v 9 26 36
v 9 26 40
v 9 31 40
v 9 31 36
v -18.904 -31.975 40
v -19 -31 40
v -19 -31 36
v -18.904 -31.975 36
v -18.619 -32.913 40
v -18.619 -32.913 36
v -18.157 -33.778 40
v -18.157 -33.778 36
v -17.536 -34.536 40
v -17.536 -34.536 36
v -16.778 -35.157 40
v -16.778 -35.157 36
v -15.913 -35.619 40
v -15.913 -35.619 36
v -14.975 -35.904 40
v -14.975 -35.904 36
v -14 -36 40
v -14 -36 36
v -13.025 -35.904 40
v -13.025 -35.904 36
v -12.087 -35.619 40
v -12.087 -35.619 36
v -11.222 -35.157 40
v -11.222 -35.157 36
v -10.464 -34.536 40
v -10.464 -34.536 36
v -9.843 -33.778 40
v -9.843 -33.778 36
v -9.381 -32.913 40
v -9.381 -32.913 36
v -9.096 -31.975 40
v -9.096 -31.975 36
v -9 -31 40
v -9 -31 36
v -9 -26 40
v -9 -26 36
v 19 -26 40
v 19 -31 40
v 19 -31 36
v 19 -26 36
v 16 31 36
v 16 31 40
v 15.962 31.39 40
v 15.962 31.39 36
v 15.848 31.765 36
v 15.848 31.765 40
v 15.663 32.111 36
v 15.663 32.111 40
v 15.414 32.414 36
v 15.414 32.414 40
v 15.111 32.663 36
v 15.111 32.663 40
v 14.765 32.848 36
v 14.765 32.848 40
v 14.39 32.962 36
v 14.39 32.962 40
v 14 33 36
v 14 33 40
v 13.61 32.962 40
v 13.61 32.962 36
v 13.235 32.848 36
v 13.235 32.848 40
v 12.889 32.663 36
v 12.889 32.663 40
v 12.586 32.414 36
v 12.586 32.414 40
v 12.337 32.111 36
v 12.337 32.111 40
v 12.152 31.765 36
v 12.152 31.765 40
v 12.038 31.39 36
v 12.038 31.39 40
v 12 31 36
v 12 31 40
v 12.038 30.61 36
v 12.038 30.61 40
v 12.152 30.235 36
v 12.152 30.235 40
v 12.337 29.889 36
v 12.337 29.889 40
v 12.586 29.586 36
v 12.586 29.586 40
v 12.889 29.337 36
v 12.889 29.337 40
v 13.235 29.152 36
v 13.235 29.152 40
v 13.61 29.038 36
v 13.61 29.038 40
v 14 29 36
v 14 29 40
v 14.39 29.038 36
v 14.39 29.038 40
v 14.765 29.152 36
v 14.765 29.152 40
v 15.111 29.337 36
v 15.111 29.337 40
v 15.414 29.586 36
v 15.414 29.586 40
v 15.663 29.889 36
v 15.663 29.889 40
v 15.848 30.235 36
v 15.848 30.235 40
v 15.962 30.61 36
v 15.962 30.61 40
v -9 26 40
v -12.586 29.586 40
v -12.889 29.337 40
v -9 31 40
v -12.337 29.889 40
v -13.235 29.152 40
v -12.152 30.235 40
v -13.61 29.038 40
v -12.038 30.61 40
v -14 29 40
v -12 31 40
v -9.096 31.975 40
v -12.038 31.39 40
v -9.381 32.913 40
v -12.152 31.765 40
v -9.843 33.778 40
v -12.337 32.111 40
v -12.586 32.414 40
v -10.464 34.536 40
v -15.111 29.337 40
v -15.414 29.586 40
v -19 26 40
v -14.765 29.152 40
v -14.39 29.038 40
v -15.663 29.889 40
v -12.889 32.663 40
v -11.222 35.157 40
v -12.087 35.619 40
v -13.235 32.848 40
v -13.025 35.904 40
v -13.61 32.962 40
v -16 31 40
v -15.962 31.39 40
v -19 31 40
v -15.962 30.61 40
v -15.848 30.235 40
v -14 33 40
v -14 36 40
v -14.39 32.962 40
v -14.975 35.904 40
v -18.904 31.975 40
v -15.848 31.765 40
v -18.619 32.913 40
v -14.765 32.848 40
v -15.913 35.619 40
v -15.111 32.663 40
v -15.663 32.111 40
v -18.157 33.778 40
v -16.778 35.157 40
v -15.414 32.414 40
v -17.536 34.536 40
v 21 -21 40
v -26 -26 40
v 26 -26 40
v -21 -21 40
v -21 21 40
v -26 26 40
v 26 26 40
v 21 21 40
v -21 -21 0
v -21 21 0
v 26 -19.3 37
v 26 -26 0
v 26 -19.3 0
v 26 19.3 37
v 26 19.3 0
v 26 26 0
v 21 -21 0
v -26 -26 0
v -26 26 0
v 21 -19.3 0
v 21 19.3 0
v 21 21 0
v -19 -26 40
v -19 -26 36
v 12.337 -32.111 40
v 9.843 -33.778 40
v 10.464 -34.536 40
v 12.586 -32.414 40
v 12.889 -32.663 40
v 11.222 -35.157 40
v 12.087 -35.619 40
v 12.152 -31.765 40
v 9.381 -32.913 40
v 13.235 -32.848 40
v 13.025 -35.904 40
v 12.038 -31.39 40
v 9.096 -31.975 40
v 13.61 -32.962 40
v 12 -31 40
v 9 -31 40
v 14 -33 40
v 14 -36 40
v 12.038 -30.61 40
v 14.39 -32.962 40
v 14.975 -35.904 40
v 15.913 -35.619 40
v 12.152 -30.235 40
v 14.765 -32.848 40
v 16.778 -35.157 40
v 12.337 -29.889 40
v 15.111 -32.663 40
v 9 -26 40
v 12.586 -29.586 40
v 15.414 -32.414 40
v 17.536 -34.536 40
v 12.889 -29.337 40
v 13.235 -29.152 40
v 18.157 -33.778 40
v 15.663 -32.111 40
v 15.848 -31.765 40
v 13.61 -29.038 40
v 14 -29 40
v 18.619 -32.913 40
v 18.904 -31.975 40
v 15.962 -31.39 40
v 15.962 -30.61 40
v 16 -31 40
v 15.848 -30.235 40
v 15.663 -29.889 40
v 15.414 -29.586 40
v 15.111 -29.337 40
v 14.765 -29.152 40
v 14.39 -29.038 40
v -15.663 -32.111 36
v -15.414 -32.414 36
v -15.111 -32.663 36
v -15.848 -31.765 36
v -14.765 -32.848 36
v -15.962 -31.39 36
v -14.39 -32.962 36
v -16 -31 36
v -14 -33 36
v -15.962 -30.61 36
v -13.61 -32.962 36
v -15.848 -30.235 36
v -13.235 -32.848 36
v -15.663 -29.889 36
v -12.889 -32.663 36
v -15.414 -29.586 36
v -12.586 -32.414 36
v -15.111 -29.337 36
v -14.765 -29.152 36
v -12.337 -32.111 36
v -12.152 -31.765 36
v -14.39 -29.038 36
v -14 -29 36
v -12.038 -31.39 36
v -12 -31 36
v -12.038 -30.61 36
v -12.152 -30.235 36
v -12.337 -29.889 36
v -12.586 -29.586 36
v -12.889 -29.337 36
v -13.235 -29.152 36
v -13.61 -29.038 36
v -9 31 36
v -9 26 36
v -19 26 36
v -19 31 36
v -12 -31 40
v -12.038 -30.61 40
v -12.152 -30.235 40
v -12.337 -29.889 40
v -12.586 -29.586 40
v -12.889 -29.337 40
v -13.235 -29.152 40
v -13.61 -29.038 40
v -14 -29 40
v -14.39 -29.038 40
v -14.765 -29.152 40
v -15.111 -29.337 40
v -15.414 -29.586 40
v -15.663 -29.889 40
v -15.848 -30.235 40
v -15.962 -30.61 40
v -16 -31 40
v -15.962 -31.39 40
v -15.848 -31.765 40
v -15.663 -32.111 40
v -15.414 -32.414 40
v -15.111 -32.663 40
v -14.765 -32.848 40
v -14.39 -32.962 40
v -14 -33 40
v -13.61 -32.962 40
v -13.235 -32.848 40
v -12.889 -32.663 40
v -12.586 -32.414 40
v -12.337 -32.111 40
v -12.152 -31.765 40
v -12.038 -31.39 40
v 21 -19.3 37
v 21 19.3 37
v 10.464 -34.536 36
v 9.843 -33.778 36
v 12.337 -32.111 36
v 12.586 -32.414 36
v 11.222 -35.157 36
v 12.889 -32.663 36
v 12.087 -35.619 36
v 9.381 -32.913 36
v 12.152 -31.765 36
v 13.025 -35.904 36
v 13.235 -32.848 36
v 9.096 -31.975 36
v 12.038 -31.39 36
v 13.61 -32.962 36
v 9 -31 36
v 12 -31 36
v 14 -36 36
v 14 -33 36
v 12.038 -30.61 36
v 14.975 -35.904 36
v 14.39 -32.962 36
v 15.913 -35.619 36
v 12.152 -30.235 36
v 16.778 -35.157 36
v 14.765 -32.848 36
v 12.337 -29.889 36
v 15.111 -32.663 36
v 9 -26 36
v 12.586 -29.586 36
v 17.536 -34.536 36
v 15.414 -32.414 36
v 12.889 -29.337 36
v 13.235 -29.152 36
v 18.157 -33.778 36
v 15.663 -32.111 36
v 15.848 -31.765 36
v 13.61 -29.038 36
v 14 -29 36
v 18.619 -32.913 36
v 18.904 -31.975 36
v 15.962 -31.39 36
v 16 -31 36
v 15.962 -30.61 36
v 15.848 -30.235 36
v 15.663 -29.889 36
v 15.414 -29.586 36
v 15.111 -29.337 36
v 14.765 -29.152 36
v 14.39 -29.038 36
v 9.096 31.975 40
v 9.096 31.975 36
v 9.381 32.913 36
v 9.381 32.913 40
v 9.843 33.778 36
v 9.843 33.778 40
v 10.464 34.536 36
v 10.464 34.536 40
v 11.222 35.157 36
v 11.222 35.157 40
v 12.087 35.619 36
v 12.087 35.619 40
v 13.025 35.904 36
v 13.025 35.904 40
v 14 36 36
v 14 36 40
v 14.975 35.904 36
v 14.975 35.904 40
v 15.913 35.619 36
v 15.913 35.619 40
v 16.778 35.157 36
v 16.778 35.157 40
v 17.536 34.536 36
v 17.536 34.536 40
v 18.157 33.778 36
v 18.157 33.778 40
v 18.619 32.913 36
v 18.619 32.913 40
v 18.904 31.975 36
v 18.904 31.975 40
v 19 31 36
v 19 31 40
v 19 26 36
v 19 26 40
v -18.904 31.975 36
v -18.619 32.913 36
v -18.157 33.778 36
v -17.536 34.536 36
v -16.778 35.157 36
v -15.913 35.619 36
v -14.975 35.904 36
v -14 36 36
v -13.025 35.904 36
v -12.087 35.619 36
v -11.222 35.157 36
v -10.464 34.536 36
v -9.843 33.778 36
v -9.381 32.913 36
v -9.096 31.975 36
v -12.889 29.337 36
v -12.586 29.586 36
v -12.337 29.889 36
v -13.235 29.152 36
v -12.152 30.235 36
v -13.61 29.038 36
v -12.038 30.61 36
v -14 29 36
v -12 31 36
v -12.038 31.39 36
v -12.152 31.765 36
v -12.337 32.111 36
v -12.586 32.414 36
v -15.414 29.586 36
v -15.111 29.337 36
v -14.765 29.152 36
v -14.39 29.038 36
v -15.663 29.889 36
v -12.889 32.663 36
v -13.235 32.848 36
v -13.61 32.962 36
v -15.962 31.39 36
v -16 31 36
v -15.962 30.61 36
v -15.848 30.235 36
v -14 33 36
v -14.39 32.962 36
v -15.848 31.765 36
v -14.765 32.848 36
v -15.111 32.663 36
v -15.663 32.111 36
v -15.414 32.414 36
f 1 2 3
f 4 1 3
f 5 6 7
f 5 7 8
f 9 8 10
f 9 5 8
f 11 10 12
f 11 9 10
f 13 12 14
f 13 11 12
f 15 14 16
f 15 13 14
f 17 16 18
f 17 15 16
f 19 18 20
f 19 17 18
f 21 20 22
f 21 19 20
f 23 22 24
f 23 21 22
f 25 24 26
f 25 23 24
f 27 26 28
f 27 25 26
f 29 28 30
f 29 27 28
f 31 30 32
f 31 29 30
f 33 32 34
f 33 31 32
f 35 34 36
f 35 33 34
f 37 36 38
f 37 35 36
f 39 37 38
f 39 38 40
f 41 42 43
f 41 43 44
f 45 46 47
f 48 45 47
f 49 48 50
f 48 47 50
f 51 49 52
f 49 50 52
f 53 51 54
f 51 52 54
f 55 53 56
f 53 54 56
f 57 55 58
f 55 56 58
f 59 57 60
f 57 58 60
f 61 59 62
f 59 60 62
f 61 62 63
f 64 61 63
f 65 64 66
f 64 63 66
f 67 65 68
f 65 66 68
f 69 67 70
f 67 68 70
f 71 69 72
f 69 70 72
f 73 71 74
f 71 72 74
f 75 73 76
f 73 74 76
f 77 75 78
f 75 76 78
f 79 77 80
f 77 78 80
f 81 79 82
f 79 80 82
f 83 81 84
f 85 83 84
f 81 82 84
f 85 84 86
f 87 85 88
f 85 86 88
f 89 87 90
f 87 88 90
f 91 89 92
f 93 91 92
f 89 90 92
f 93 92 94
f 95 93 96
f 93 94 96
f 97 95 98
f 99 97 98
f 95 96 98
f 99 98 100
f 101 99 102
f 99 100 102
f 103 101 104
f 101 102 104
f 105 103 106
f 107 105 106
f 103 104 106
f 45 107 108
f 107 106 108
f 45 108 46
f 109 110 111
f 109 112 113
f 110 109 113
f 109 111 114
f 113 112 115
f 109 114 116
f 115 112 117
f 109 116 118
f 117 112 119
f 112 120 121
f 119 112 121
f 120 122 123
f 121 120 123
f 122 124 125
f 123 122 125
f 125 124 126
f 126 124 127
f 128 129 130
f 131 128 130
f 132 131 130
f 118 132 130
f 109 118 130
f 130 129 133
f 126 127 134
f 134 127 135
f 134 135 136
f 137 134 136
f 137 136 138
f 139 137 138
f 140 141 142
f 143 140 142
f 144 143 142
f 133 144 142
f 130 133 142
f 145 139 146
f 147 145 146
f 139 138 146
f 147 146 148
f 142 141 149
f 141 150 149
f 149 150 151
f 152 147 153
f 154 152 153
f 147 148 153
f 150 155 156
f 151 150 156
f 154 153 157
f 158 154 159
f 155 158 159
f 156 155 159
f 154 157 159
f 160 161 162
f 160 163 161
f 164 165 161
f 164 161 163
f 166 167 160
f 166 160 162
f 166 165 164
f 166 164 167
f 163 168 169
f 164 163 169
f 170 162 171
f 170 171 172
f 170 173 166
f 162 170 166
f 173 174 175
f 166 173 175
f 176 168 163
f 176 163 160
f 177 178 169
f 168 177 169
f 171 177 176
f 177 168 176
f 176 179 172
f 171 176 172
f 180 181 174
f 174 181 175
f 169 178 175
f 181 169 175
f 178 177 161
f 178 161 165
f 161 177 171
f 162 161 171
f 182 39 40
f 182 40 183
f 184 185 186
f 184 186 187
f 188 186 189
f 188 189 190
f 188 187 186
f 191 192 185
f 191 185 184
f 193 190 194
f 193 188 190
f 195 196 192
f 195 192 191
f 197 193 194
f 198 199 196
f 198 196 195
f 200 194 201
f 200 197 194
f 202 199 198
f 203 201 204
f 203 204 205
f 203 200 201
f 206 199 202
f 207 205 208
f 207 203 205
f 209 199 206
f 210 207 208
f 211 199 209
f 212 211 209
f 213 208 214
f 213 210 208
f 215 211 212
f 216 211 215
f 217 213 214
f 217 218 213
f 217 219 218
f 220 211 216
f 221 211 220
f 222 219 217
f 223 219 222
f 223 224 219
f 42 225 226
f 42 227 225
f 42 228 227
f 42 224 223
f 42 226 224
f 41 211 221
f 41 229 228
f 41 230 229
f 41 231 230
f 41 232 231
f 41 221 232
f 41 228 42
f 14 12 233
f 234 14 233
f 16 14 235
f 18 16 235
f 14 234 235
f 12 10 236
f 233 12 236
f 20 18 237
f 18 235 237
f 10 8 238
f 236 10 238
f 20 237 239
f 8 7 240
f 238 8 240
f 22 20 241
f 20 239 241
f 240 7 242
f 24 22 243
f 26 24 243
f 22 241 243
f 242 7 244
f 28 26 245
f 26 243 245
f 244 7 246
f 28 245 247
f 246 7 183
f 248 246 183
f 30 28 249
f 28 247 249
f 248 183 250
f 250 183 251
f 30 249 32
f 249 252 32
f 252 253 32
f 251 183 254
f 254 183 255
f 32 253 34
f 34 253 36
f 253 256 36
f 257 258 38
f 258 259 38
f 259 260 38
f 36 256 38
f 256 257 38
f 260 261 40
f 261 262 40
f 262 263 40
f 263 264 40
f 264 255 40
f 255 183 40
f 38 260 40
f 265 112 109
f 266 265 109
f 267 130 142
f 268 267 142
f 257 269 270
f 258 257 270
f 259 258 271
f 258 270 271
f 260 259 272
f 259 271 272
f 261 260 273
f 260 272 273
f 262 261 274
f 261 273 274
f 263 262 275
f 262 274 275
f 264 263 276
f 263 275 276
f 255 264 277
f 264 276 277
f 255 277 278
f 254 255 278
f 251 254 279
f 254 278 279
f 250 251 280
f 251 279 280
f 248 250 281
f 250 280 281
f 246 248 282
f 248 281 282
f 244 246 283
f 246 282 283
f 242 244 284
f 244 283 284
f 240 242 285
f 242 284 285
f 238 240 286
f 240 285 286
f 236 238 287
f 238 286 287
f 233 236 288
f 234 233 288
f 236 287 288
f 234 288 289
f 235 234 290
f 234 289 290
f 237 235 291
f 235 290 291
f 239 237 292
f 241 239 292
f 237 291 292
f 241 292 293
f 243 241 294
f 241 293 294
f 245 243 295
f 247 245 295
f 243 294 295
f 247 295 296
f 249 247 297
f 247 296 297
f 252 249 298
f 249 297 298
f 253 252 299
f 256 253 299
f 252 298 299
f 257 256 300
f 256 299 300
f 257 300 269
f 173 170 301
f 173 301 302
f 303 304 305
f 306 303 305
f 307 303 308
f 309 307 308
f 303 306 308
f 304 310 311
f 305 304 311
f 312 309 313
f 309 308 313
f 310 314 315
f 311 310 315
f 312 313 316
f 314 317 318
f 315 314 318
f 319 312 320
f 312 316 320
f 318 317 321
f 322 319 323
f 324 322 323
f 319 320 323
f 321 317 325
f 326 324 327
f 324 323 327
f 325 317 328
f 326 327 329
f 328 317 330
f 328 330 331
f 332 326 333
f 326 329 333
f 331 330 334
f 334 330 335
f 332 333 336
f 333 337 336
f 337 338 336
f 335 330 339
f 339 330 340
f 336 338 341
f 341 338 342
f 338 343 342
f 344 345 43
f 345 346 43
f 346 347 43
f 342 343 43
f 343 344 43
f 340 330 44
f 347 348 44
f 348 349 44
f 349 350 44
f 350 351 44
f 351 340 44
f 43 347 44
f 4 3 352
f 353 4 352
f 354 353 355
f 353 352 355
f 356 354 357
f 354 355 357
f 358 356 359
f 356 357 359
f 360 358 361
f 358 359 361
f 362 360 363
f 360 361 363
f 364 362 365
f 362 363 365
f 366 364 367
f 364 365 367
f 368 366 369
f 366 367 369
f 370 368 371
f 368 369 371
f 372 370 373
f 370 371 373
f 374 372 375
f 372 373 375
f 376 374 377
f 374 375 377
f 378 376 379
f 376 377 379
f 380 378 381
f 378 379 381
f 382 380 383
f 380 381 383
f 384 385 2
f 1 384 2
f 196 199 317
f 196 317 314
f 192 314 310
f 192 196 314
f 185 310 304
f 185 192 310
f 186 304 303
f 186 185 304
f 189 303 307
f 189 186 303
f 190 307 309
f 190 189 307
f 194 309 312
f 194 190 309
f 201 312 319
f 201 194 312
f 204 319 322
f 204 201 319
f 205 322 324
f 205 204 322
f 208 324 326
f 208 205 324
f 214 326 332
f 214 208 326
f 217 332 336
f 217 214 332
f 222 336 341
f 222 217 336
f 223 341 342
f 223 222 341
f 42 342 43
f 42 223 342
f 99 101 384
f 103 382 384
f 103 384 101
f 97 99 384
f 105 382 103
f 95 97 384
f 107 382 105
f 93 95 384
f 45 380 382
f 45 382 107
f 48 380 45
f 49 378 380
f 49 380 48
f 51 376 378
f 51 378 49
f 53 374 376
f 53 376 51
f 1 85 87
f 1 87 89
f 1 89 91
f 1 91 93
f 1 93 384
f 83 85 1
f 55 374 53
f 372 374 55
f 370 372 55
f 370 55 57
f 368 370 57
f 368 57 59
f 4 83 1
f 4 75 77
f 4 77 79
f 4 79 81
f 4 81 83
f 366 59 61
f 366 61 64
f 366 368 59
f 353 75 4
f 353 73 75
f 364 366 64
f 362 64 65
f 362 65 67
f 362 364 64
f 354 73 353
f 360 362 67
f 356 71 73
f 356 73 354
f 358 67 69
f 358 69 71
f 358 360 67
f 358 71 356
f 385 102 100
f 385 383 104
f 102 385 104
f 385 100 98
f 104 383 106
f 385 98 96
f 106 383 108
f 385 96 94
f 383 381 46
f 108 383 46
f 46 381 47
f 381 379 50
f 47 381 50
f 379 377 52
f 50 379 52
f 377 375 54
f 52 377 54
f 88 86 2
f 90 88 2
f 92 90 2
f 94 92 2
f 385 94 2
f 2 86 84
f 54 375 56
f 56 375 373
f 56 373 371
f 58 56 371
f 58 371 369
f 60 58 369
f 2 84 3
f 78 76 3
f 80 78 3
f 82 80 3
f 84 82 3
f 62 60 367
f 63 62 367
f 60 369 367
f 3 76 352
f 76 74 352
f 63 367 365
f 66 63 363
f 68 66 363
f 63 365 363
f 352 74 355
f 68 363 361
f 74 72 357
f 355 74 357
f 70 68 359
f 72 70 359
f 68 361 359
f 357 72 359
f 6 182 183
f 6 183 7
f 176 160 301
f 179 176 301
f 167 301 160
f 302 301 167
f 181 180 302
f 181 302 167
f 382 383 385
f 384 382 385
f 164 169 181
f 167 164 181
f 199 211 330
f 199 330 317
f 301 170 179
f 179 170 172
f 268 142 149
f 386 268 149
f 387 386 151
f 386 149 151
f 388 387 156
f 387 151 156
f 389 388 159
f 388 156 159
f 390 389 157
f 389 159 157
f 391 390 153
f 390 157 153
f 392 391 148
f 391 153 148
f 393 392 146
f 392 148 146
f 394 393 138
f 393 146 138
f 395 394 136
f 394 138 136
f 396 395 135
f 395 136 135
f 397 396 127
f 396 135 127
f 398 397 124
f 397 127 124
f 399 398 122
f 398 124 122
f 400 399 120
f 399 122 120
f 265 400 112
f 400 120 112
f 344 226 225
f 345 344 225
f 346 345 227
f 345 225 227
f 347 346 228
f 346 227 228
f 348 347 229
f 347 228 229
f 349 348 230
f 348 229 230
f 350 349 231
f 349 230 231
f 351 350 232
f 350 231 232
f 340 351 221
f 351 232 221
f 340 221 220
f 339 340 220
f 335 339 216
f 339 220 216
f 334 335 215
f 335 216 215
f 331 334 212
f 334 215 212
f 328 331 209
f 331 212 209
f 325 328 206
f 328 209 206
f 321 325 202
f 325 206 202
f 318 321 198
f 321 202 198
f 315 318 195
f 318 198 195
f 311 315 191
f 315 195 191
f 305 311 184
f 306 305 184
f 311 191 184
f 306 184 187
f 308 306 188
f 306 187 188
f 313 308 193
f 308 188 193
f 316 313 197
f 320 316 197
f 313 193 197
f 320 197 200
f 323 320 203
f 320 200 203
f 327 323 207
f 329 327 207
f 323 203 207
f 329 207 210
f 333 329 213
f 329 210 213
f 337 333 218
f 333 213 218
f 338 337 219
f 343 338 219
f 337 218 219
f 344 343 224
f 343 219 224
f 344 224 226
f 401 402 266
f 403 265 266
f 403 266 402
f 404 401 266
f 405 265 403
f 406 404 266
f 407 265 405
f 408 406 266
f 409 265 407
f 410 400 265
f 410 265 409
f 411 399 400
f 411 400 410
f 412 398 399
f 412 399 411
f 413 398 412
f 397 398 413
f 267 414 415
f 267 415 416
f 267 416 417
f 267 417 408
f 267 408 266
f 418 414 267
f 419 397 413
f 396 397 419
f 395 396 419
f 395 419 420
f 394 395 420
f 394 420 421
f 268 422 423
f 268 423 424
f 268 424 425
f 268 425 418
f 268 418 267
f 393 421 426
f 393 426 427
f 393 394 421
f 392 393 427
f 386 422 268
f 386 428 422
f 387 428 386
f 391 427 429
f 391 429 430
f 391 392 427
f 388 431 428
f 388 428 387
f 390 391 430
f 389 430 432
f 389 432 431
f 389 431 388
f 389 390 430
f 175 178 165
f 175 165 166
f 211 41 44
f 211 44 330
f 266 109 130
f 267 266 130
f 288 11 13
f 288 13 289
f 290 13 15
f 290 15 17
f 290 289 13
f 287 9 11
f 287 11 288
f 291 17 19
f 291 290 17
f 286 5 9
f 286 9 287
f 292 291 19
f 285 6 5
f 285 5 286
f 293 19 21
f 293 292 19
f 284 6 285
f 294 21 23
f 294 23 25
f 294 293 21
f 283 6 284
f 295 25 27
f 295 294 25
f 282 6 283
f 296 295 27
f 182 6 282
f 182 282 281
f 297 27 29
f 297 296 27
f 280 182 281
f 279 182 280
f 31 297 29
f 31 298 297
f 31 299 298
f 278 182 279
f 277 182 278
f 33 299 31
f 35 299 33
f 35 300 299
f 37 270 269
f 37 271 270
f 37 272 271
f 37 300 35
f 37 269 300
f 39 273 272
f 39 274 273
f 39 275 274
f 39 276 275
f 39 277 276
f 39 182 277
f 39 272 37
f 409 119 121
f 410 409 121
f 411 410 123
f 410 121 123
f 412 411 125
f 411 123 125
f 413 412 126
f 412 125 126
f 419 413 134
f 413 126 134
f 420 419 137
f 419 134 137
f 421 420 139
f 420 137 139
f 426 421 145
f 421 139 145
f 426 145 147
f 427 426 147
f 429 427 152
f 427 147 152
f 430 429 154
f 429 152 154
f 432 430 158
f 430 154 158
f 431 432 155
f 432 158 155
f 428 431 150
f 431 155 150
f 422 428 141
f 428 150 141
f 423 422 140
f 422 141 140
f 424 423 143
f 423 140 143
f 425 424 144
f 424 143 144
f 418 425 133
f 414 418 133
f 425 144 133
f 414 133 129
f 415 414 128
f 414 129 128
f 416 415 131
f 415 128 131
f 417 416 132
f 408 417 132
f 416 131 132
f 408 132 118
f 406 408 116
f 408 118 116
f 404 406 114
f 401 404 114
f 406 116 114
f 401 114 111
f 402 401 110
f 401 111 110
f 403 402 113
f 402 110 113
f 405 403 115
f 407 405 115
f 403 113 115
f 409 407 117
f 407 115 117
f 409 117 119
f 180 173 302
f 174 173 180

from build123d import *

# Parameters (mm, degrees)
SKETCH_2_W          = 52
SKETCH_2_H          = 52
EXTRUDE_1_DEPTH     = 40
SKETCH_1_W          = 42
SKETCH_1_H          = 42
CUT_EXTRUDE_1_DEPTH = 40
CUT_EXTRUDE_2_REACH = 54
SKETCH_4_W          = 37
SKETCH_4_H          = 38.6
SKETCH_5_R          = 2
EXTRUDE_2_DEPTH     = 4
EXTRUDE_2_2_DEPTH   = 4
EXTRUDE_2_3_DEPTH   = 4
EXTRUDE_2_4_DEPTH   = 4


with BuildPart() as part:
    # 草圖2 → 填料-伸長1 (new body)
    with BuildSketch(Plane.XY):
        Rectangle(SKETCH_2_W, SKETCH_2_H)
    extrude(amount=EXTRUDE_1_DEPTH)

    # 草圖1 → 除料-伸長1 (cut)
    with BuildSketch(Plane.XY):
        Rectangle(SKETCH_1_W, SKETCH_1_H)
    extrude(amount=CUT_EXTRUDE_1_DEPTH, mode=Mode.SUBTRACT)

    # 草圖4 → 除料-伸長2 (cut, up to next)
    with BuildSketch(Plane(origin=(26, 0, 0), x_dir=(0, 0, -1), z_dir=(1, 0, 0)), mode=Mode.PRIVATE) as cut_extrude_2_sk1:
        with Locations((-18.5, 0)):
            Rectangle(SKETCH_4_W, SKETCH_4_H)
    cut_extrude_2_tool1 = extrude(cut_extrude_2_sk1.sketch, amount=-CUT_EXTRUDE_2_REACH, mode=Mode.PRIVATE) & part.part
    add(cut_extrude_2_tool1.solids().sort_by_distance((26, 0, 18.5))[0], mode=Mode.SUBTRACT)


with BuildPart() as body_2:
    # 草圖5 → 填料-伸長2 (new body)
    with BuildSketch(Plane.XY.offset(40)):
        with BuildLine():
            Line((-19, 26), (-19, 31))
            ThreePointArc((-19, 31), (-14, 36), (-9, 31))
            Line((-9, 31), (-9, 26))
            Line((-9, 26), (-19, 26))
        make_face()
        with Locations((-14, 31)):
            Circle(SKETCH_5_R, mode=Mode.SUBTRACT)
    extrude(amount=-EXTRUDE_2_DEPTH)


with BuildPart() as body_3:
    # 草圖5 → Extrude 2 2 (new body)
    with BuildSketch(Plane.XY.offset(40)):
        with BuildLine():
            Line((19, 31), (19, 26))
            Line((19, 26), (9, 26))
            Line((9, 26), (9, 31))
            ThreePointArc((9, 31), (14, 36), (19, 31))
        make_face()
        with Locations((14, 31)):
            Circle(SKETCH_5_R, mode=Mode.SUBTRACT)
    extrude(amount=-EXTRUDE_2_2_DEPTH)


with BuildPart() as body_4:
    # 草圖5 → Extrude 2 3 (new body)
    with BuildSketch(Plane.XY.offset(40)):
        with BuildLine():
            Line((9, -26), (9, -31))
            ThreePointArc((9, -31), (14, -36), (19, -31))
            Line((19, -31), (19, -26))
            Line((19, -26), (9, -26))
        make_face()
        with Locations((14, -31)):
            Circle(SKETCH_5_R, mode=Mode.SUBTRACT)
    extrude(amount=-EXTRUDE_2_3_DEPTH)


with BuildPart() as body_5:
    # 草圖5 → Extrude 2 4 (new body)
    with BuildSketch(Plane.XY.offset(40)):
        with BuildLine():
            Line((-9, -26), (-19, -26))
            Line((-19, -26), (-19, -31))
            ThreePointArc((-19, -31), (-14, -36), (-9, -31))
            Line((-9, -31), (-9, -26))
        make_face()
        with Locations((-14, -31)):
            Circle(SKETCH_5_R, mode=Mode.SUBTRACT)
    extrude(amount=-EXTRUDE_2_4_DEPTH)


solid = Compound([part.part, body_2.part, body_3.part, body_4.part, body_5.part])
